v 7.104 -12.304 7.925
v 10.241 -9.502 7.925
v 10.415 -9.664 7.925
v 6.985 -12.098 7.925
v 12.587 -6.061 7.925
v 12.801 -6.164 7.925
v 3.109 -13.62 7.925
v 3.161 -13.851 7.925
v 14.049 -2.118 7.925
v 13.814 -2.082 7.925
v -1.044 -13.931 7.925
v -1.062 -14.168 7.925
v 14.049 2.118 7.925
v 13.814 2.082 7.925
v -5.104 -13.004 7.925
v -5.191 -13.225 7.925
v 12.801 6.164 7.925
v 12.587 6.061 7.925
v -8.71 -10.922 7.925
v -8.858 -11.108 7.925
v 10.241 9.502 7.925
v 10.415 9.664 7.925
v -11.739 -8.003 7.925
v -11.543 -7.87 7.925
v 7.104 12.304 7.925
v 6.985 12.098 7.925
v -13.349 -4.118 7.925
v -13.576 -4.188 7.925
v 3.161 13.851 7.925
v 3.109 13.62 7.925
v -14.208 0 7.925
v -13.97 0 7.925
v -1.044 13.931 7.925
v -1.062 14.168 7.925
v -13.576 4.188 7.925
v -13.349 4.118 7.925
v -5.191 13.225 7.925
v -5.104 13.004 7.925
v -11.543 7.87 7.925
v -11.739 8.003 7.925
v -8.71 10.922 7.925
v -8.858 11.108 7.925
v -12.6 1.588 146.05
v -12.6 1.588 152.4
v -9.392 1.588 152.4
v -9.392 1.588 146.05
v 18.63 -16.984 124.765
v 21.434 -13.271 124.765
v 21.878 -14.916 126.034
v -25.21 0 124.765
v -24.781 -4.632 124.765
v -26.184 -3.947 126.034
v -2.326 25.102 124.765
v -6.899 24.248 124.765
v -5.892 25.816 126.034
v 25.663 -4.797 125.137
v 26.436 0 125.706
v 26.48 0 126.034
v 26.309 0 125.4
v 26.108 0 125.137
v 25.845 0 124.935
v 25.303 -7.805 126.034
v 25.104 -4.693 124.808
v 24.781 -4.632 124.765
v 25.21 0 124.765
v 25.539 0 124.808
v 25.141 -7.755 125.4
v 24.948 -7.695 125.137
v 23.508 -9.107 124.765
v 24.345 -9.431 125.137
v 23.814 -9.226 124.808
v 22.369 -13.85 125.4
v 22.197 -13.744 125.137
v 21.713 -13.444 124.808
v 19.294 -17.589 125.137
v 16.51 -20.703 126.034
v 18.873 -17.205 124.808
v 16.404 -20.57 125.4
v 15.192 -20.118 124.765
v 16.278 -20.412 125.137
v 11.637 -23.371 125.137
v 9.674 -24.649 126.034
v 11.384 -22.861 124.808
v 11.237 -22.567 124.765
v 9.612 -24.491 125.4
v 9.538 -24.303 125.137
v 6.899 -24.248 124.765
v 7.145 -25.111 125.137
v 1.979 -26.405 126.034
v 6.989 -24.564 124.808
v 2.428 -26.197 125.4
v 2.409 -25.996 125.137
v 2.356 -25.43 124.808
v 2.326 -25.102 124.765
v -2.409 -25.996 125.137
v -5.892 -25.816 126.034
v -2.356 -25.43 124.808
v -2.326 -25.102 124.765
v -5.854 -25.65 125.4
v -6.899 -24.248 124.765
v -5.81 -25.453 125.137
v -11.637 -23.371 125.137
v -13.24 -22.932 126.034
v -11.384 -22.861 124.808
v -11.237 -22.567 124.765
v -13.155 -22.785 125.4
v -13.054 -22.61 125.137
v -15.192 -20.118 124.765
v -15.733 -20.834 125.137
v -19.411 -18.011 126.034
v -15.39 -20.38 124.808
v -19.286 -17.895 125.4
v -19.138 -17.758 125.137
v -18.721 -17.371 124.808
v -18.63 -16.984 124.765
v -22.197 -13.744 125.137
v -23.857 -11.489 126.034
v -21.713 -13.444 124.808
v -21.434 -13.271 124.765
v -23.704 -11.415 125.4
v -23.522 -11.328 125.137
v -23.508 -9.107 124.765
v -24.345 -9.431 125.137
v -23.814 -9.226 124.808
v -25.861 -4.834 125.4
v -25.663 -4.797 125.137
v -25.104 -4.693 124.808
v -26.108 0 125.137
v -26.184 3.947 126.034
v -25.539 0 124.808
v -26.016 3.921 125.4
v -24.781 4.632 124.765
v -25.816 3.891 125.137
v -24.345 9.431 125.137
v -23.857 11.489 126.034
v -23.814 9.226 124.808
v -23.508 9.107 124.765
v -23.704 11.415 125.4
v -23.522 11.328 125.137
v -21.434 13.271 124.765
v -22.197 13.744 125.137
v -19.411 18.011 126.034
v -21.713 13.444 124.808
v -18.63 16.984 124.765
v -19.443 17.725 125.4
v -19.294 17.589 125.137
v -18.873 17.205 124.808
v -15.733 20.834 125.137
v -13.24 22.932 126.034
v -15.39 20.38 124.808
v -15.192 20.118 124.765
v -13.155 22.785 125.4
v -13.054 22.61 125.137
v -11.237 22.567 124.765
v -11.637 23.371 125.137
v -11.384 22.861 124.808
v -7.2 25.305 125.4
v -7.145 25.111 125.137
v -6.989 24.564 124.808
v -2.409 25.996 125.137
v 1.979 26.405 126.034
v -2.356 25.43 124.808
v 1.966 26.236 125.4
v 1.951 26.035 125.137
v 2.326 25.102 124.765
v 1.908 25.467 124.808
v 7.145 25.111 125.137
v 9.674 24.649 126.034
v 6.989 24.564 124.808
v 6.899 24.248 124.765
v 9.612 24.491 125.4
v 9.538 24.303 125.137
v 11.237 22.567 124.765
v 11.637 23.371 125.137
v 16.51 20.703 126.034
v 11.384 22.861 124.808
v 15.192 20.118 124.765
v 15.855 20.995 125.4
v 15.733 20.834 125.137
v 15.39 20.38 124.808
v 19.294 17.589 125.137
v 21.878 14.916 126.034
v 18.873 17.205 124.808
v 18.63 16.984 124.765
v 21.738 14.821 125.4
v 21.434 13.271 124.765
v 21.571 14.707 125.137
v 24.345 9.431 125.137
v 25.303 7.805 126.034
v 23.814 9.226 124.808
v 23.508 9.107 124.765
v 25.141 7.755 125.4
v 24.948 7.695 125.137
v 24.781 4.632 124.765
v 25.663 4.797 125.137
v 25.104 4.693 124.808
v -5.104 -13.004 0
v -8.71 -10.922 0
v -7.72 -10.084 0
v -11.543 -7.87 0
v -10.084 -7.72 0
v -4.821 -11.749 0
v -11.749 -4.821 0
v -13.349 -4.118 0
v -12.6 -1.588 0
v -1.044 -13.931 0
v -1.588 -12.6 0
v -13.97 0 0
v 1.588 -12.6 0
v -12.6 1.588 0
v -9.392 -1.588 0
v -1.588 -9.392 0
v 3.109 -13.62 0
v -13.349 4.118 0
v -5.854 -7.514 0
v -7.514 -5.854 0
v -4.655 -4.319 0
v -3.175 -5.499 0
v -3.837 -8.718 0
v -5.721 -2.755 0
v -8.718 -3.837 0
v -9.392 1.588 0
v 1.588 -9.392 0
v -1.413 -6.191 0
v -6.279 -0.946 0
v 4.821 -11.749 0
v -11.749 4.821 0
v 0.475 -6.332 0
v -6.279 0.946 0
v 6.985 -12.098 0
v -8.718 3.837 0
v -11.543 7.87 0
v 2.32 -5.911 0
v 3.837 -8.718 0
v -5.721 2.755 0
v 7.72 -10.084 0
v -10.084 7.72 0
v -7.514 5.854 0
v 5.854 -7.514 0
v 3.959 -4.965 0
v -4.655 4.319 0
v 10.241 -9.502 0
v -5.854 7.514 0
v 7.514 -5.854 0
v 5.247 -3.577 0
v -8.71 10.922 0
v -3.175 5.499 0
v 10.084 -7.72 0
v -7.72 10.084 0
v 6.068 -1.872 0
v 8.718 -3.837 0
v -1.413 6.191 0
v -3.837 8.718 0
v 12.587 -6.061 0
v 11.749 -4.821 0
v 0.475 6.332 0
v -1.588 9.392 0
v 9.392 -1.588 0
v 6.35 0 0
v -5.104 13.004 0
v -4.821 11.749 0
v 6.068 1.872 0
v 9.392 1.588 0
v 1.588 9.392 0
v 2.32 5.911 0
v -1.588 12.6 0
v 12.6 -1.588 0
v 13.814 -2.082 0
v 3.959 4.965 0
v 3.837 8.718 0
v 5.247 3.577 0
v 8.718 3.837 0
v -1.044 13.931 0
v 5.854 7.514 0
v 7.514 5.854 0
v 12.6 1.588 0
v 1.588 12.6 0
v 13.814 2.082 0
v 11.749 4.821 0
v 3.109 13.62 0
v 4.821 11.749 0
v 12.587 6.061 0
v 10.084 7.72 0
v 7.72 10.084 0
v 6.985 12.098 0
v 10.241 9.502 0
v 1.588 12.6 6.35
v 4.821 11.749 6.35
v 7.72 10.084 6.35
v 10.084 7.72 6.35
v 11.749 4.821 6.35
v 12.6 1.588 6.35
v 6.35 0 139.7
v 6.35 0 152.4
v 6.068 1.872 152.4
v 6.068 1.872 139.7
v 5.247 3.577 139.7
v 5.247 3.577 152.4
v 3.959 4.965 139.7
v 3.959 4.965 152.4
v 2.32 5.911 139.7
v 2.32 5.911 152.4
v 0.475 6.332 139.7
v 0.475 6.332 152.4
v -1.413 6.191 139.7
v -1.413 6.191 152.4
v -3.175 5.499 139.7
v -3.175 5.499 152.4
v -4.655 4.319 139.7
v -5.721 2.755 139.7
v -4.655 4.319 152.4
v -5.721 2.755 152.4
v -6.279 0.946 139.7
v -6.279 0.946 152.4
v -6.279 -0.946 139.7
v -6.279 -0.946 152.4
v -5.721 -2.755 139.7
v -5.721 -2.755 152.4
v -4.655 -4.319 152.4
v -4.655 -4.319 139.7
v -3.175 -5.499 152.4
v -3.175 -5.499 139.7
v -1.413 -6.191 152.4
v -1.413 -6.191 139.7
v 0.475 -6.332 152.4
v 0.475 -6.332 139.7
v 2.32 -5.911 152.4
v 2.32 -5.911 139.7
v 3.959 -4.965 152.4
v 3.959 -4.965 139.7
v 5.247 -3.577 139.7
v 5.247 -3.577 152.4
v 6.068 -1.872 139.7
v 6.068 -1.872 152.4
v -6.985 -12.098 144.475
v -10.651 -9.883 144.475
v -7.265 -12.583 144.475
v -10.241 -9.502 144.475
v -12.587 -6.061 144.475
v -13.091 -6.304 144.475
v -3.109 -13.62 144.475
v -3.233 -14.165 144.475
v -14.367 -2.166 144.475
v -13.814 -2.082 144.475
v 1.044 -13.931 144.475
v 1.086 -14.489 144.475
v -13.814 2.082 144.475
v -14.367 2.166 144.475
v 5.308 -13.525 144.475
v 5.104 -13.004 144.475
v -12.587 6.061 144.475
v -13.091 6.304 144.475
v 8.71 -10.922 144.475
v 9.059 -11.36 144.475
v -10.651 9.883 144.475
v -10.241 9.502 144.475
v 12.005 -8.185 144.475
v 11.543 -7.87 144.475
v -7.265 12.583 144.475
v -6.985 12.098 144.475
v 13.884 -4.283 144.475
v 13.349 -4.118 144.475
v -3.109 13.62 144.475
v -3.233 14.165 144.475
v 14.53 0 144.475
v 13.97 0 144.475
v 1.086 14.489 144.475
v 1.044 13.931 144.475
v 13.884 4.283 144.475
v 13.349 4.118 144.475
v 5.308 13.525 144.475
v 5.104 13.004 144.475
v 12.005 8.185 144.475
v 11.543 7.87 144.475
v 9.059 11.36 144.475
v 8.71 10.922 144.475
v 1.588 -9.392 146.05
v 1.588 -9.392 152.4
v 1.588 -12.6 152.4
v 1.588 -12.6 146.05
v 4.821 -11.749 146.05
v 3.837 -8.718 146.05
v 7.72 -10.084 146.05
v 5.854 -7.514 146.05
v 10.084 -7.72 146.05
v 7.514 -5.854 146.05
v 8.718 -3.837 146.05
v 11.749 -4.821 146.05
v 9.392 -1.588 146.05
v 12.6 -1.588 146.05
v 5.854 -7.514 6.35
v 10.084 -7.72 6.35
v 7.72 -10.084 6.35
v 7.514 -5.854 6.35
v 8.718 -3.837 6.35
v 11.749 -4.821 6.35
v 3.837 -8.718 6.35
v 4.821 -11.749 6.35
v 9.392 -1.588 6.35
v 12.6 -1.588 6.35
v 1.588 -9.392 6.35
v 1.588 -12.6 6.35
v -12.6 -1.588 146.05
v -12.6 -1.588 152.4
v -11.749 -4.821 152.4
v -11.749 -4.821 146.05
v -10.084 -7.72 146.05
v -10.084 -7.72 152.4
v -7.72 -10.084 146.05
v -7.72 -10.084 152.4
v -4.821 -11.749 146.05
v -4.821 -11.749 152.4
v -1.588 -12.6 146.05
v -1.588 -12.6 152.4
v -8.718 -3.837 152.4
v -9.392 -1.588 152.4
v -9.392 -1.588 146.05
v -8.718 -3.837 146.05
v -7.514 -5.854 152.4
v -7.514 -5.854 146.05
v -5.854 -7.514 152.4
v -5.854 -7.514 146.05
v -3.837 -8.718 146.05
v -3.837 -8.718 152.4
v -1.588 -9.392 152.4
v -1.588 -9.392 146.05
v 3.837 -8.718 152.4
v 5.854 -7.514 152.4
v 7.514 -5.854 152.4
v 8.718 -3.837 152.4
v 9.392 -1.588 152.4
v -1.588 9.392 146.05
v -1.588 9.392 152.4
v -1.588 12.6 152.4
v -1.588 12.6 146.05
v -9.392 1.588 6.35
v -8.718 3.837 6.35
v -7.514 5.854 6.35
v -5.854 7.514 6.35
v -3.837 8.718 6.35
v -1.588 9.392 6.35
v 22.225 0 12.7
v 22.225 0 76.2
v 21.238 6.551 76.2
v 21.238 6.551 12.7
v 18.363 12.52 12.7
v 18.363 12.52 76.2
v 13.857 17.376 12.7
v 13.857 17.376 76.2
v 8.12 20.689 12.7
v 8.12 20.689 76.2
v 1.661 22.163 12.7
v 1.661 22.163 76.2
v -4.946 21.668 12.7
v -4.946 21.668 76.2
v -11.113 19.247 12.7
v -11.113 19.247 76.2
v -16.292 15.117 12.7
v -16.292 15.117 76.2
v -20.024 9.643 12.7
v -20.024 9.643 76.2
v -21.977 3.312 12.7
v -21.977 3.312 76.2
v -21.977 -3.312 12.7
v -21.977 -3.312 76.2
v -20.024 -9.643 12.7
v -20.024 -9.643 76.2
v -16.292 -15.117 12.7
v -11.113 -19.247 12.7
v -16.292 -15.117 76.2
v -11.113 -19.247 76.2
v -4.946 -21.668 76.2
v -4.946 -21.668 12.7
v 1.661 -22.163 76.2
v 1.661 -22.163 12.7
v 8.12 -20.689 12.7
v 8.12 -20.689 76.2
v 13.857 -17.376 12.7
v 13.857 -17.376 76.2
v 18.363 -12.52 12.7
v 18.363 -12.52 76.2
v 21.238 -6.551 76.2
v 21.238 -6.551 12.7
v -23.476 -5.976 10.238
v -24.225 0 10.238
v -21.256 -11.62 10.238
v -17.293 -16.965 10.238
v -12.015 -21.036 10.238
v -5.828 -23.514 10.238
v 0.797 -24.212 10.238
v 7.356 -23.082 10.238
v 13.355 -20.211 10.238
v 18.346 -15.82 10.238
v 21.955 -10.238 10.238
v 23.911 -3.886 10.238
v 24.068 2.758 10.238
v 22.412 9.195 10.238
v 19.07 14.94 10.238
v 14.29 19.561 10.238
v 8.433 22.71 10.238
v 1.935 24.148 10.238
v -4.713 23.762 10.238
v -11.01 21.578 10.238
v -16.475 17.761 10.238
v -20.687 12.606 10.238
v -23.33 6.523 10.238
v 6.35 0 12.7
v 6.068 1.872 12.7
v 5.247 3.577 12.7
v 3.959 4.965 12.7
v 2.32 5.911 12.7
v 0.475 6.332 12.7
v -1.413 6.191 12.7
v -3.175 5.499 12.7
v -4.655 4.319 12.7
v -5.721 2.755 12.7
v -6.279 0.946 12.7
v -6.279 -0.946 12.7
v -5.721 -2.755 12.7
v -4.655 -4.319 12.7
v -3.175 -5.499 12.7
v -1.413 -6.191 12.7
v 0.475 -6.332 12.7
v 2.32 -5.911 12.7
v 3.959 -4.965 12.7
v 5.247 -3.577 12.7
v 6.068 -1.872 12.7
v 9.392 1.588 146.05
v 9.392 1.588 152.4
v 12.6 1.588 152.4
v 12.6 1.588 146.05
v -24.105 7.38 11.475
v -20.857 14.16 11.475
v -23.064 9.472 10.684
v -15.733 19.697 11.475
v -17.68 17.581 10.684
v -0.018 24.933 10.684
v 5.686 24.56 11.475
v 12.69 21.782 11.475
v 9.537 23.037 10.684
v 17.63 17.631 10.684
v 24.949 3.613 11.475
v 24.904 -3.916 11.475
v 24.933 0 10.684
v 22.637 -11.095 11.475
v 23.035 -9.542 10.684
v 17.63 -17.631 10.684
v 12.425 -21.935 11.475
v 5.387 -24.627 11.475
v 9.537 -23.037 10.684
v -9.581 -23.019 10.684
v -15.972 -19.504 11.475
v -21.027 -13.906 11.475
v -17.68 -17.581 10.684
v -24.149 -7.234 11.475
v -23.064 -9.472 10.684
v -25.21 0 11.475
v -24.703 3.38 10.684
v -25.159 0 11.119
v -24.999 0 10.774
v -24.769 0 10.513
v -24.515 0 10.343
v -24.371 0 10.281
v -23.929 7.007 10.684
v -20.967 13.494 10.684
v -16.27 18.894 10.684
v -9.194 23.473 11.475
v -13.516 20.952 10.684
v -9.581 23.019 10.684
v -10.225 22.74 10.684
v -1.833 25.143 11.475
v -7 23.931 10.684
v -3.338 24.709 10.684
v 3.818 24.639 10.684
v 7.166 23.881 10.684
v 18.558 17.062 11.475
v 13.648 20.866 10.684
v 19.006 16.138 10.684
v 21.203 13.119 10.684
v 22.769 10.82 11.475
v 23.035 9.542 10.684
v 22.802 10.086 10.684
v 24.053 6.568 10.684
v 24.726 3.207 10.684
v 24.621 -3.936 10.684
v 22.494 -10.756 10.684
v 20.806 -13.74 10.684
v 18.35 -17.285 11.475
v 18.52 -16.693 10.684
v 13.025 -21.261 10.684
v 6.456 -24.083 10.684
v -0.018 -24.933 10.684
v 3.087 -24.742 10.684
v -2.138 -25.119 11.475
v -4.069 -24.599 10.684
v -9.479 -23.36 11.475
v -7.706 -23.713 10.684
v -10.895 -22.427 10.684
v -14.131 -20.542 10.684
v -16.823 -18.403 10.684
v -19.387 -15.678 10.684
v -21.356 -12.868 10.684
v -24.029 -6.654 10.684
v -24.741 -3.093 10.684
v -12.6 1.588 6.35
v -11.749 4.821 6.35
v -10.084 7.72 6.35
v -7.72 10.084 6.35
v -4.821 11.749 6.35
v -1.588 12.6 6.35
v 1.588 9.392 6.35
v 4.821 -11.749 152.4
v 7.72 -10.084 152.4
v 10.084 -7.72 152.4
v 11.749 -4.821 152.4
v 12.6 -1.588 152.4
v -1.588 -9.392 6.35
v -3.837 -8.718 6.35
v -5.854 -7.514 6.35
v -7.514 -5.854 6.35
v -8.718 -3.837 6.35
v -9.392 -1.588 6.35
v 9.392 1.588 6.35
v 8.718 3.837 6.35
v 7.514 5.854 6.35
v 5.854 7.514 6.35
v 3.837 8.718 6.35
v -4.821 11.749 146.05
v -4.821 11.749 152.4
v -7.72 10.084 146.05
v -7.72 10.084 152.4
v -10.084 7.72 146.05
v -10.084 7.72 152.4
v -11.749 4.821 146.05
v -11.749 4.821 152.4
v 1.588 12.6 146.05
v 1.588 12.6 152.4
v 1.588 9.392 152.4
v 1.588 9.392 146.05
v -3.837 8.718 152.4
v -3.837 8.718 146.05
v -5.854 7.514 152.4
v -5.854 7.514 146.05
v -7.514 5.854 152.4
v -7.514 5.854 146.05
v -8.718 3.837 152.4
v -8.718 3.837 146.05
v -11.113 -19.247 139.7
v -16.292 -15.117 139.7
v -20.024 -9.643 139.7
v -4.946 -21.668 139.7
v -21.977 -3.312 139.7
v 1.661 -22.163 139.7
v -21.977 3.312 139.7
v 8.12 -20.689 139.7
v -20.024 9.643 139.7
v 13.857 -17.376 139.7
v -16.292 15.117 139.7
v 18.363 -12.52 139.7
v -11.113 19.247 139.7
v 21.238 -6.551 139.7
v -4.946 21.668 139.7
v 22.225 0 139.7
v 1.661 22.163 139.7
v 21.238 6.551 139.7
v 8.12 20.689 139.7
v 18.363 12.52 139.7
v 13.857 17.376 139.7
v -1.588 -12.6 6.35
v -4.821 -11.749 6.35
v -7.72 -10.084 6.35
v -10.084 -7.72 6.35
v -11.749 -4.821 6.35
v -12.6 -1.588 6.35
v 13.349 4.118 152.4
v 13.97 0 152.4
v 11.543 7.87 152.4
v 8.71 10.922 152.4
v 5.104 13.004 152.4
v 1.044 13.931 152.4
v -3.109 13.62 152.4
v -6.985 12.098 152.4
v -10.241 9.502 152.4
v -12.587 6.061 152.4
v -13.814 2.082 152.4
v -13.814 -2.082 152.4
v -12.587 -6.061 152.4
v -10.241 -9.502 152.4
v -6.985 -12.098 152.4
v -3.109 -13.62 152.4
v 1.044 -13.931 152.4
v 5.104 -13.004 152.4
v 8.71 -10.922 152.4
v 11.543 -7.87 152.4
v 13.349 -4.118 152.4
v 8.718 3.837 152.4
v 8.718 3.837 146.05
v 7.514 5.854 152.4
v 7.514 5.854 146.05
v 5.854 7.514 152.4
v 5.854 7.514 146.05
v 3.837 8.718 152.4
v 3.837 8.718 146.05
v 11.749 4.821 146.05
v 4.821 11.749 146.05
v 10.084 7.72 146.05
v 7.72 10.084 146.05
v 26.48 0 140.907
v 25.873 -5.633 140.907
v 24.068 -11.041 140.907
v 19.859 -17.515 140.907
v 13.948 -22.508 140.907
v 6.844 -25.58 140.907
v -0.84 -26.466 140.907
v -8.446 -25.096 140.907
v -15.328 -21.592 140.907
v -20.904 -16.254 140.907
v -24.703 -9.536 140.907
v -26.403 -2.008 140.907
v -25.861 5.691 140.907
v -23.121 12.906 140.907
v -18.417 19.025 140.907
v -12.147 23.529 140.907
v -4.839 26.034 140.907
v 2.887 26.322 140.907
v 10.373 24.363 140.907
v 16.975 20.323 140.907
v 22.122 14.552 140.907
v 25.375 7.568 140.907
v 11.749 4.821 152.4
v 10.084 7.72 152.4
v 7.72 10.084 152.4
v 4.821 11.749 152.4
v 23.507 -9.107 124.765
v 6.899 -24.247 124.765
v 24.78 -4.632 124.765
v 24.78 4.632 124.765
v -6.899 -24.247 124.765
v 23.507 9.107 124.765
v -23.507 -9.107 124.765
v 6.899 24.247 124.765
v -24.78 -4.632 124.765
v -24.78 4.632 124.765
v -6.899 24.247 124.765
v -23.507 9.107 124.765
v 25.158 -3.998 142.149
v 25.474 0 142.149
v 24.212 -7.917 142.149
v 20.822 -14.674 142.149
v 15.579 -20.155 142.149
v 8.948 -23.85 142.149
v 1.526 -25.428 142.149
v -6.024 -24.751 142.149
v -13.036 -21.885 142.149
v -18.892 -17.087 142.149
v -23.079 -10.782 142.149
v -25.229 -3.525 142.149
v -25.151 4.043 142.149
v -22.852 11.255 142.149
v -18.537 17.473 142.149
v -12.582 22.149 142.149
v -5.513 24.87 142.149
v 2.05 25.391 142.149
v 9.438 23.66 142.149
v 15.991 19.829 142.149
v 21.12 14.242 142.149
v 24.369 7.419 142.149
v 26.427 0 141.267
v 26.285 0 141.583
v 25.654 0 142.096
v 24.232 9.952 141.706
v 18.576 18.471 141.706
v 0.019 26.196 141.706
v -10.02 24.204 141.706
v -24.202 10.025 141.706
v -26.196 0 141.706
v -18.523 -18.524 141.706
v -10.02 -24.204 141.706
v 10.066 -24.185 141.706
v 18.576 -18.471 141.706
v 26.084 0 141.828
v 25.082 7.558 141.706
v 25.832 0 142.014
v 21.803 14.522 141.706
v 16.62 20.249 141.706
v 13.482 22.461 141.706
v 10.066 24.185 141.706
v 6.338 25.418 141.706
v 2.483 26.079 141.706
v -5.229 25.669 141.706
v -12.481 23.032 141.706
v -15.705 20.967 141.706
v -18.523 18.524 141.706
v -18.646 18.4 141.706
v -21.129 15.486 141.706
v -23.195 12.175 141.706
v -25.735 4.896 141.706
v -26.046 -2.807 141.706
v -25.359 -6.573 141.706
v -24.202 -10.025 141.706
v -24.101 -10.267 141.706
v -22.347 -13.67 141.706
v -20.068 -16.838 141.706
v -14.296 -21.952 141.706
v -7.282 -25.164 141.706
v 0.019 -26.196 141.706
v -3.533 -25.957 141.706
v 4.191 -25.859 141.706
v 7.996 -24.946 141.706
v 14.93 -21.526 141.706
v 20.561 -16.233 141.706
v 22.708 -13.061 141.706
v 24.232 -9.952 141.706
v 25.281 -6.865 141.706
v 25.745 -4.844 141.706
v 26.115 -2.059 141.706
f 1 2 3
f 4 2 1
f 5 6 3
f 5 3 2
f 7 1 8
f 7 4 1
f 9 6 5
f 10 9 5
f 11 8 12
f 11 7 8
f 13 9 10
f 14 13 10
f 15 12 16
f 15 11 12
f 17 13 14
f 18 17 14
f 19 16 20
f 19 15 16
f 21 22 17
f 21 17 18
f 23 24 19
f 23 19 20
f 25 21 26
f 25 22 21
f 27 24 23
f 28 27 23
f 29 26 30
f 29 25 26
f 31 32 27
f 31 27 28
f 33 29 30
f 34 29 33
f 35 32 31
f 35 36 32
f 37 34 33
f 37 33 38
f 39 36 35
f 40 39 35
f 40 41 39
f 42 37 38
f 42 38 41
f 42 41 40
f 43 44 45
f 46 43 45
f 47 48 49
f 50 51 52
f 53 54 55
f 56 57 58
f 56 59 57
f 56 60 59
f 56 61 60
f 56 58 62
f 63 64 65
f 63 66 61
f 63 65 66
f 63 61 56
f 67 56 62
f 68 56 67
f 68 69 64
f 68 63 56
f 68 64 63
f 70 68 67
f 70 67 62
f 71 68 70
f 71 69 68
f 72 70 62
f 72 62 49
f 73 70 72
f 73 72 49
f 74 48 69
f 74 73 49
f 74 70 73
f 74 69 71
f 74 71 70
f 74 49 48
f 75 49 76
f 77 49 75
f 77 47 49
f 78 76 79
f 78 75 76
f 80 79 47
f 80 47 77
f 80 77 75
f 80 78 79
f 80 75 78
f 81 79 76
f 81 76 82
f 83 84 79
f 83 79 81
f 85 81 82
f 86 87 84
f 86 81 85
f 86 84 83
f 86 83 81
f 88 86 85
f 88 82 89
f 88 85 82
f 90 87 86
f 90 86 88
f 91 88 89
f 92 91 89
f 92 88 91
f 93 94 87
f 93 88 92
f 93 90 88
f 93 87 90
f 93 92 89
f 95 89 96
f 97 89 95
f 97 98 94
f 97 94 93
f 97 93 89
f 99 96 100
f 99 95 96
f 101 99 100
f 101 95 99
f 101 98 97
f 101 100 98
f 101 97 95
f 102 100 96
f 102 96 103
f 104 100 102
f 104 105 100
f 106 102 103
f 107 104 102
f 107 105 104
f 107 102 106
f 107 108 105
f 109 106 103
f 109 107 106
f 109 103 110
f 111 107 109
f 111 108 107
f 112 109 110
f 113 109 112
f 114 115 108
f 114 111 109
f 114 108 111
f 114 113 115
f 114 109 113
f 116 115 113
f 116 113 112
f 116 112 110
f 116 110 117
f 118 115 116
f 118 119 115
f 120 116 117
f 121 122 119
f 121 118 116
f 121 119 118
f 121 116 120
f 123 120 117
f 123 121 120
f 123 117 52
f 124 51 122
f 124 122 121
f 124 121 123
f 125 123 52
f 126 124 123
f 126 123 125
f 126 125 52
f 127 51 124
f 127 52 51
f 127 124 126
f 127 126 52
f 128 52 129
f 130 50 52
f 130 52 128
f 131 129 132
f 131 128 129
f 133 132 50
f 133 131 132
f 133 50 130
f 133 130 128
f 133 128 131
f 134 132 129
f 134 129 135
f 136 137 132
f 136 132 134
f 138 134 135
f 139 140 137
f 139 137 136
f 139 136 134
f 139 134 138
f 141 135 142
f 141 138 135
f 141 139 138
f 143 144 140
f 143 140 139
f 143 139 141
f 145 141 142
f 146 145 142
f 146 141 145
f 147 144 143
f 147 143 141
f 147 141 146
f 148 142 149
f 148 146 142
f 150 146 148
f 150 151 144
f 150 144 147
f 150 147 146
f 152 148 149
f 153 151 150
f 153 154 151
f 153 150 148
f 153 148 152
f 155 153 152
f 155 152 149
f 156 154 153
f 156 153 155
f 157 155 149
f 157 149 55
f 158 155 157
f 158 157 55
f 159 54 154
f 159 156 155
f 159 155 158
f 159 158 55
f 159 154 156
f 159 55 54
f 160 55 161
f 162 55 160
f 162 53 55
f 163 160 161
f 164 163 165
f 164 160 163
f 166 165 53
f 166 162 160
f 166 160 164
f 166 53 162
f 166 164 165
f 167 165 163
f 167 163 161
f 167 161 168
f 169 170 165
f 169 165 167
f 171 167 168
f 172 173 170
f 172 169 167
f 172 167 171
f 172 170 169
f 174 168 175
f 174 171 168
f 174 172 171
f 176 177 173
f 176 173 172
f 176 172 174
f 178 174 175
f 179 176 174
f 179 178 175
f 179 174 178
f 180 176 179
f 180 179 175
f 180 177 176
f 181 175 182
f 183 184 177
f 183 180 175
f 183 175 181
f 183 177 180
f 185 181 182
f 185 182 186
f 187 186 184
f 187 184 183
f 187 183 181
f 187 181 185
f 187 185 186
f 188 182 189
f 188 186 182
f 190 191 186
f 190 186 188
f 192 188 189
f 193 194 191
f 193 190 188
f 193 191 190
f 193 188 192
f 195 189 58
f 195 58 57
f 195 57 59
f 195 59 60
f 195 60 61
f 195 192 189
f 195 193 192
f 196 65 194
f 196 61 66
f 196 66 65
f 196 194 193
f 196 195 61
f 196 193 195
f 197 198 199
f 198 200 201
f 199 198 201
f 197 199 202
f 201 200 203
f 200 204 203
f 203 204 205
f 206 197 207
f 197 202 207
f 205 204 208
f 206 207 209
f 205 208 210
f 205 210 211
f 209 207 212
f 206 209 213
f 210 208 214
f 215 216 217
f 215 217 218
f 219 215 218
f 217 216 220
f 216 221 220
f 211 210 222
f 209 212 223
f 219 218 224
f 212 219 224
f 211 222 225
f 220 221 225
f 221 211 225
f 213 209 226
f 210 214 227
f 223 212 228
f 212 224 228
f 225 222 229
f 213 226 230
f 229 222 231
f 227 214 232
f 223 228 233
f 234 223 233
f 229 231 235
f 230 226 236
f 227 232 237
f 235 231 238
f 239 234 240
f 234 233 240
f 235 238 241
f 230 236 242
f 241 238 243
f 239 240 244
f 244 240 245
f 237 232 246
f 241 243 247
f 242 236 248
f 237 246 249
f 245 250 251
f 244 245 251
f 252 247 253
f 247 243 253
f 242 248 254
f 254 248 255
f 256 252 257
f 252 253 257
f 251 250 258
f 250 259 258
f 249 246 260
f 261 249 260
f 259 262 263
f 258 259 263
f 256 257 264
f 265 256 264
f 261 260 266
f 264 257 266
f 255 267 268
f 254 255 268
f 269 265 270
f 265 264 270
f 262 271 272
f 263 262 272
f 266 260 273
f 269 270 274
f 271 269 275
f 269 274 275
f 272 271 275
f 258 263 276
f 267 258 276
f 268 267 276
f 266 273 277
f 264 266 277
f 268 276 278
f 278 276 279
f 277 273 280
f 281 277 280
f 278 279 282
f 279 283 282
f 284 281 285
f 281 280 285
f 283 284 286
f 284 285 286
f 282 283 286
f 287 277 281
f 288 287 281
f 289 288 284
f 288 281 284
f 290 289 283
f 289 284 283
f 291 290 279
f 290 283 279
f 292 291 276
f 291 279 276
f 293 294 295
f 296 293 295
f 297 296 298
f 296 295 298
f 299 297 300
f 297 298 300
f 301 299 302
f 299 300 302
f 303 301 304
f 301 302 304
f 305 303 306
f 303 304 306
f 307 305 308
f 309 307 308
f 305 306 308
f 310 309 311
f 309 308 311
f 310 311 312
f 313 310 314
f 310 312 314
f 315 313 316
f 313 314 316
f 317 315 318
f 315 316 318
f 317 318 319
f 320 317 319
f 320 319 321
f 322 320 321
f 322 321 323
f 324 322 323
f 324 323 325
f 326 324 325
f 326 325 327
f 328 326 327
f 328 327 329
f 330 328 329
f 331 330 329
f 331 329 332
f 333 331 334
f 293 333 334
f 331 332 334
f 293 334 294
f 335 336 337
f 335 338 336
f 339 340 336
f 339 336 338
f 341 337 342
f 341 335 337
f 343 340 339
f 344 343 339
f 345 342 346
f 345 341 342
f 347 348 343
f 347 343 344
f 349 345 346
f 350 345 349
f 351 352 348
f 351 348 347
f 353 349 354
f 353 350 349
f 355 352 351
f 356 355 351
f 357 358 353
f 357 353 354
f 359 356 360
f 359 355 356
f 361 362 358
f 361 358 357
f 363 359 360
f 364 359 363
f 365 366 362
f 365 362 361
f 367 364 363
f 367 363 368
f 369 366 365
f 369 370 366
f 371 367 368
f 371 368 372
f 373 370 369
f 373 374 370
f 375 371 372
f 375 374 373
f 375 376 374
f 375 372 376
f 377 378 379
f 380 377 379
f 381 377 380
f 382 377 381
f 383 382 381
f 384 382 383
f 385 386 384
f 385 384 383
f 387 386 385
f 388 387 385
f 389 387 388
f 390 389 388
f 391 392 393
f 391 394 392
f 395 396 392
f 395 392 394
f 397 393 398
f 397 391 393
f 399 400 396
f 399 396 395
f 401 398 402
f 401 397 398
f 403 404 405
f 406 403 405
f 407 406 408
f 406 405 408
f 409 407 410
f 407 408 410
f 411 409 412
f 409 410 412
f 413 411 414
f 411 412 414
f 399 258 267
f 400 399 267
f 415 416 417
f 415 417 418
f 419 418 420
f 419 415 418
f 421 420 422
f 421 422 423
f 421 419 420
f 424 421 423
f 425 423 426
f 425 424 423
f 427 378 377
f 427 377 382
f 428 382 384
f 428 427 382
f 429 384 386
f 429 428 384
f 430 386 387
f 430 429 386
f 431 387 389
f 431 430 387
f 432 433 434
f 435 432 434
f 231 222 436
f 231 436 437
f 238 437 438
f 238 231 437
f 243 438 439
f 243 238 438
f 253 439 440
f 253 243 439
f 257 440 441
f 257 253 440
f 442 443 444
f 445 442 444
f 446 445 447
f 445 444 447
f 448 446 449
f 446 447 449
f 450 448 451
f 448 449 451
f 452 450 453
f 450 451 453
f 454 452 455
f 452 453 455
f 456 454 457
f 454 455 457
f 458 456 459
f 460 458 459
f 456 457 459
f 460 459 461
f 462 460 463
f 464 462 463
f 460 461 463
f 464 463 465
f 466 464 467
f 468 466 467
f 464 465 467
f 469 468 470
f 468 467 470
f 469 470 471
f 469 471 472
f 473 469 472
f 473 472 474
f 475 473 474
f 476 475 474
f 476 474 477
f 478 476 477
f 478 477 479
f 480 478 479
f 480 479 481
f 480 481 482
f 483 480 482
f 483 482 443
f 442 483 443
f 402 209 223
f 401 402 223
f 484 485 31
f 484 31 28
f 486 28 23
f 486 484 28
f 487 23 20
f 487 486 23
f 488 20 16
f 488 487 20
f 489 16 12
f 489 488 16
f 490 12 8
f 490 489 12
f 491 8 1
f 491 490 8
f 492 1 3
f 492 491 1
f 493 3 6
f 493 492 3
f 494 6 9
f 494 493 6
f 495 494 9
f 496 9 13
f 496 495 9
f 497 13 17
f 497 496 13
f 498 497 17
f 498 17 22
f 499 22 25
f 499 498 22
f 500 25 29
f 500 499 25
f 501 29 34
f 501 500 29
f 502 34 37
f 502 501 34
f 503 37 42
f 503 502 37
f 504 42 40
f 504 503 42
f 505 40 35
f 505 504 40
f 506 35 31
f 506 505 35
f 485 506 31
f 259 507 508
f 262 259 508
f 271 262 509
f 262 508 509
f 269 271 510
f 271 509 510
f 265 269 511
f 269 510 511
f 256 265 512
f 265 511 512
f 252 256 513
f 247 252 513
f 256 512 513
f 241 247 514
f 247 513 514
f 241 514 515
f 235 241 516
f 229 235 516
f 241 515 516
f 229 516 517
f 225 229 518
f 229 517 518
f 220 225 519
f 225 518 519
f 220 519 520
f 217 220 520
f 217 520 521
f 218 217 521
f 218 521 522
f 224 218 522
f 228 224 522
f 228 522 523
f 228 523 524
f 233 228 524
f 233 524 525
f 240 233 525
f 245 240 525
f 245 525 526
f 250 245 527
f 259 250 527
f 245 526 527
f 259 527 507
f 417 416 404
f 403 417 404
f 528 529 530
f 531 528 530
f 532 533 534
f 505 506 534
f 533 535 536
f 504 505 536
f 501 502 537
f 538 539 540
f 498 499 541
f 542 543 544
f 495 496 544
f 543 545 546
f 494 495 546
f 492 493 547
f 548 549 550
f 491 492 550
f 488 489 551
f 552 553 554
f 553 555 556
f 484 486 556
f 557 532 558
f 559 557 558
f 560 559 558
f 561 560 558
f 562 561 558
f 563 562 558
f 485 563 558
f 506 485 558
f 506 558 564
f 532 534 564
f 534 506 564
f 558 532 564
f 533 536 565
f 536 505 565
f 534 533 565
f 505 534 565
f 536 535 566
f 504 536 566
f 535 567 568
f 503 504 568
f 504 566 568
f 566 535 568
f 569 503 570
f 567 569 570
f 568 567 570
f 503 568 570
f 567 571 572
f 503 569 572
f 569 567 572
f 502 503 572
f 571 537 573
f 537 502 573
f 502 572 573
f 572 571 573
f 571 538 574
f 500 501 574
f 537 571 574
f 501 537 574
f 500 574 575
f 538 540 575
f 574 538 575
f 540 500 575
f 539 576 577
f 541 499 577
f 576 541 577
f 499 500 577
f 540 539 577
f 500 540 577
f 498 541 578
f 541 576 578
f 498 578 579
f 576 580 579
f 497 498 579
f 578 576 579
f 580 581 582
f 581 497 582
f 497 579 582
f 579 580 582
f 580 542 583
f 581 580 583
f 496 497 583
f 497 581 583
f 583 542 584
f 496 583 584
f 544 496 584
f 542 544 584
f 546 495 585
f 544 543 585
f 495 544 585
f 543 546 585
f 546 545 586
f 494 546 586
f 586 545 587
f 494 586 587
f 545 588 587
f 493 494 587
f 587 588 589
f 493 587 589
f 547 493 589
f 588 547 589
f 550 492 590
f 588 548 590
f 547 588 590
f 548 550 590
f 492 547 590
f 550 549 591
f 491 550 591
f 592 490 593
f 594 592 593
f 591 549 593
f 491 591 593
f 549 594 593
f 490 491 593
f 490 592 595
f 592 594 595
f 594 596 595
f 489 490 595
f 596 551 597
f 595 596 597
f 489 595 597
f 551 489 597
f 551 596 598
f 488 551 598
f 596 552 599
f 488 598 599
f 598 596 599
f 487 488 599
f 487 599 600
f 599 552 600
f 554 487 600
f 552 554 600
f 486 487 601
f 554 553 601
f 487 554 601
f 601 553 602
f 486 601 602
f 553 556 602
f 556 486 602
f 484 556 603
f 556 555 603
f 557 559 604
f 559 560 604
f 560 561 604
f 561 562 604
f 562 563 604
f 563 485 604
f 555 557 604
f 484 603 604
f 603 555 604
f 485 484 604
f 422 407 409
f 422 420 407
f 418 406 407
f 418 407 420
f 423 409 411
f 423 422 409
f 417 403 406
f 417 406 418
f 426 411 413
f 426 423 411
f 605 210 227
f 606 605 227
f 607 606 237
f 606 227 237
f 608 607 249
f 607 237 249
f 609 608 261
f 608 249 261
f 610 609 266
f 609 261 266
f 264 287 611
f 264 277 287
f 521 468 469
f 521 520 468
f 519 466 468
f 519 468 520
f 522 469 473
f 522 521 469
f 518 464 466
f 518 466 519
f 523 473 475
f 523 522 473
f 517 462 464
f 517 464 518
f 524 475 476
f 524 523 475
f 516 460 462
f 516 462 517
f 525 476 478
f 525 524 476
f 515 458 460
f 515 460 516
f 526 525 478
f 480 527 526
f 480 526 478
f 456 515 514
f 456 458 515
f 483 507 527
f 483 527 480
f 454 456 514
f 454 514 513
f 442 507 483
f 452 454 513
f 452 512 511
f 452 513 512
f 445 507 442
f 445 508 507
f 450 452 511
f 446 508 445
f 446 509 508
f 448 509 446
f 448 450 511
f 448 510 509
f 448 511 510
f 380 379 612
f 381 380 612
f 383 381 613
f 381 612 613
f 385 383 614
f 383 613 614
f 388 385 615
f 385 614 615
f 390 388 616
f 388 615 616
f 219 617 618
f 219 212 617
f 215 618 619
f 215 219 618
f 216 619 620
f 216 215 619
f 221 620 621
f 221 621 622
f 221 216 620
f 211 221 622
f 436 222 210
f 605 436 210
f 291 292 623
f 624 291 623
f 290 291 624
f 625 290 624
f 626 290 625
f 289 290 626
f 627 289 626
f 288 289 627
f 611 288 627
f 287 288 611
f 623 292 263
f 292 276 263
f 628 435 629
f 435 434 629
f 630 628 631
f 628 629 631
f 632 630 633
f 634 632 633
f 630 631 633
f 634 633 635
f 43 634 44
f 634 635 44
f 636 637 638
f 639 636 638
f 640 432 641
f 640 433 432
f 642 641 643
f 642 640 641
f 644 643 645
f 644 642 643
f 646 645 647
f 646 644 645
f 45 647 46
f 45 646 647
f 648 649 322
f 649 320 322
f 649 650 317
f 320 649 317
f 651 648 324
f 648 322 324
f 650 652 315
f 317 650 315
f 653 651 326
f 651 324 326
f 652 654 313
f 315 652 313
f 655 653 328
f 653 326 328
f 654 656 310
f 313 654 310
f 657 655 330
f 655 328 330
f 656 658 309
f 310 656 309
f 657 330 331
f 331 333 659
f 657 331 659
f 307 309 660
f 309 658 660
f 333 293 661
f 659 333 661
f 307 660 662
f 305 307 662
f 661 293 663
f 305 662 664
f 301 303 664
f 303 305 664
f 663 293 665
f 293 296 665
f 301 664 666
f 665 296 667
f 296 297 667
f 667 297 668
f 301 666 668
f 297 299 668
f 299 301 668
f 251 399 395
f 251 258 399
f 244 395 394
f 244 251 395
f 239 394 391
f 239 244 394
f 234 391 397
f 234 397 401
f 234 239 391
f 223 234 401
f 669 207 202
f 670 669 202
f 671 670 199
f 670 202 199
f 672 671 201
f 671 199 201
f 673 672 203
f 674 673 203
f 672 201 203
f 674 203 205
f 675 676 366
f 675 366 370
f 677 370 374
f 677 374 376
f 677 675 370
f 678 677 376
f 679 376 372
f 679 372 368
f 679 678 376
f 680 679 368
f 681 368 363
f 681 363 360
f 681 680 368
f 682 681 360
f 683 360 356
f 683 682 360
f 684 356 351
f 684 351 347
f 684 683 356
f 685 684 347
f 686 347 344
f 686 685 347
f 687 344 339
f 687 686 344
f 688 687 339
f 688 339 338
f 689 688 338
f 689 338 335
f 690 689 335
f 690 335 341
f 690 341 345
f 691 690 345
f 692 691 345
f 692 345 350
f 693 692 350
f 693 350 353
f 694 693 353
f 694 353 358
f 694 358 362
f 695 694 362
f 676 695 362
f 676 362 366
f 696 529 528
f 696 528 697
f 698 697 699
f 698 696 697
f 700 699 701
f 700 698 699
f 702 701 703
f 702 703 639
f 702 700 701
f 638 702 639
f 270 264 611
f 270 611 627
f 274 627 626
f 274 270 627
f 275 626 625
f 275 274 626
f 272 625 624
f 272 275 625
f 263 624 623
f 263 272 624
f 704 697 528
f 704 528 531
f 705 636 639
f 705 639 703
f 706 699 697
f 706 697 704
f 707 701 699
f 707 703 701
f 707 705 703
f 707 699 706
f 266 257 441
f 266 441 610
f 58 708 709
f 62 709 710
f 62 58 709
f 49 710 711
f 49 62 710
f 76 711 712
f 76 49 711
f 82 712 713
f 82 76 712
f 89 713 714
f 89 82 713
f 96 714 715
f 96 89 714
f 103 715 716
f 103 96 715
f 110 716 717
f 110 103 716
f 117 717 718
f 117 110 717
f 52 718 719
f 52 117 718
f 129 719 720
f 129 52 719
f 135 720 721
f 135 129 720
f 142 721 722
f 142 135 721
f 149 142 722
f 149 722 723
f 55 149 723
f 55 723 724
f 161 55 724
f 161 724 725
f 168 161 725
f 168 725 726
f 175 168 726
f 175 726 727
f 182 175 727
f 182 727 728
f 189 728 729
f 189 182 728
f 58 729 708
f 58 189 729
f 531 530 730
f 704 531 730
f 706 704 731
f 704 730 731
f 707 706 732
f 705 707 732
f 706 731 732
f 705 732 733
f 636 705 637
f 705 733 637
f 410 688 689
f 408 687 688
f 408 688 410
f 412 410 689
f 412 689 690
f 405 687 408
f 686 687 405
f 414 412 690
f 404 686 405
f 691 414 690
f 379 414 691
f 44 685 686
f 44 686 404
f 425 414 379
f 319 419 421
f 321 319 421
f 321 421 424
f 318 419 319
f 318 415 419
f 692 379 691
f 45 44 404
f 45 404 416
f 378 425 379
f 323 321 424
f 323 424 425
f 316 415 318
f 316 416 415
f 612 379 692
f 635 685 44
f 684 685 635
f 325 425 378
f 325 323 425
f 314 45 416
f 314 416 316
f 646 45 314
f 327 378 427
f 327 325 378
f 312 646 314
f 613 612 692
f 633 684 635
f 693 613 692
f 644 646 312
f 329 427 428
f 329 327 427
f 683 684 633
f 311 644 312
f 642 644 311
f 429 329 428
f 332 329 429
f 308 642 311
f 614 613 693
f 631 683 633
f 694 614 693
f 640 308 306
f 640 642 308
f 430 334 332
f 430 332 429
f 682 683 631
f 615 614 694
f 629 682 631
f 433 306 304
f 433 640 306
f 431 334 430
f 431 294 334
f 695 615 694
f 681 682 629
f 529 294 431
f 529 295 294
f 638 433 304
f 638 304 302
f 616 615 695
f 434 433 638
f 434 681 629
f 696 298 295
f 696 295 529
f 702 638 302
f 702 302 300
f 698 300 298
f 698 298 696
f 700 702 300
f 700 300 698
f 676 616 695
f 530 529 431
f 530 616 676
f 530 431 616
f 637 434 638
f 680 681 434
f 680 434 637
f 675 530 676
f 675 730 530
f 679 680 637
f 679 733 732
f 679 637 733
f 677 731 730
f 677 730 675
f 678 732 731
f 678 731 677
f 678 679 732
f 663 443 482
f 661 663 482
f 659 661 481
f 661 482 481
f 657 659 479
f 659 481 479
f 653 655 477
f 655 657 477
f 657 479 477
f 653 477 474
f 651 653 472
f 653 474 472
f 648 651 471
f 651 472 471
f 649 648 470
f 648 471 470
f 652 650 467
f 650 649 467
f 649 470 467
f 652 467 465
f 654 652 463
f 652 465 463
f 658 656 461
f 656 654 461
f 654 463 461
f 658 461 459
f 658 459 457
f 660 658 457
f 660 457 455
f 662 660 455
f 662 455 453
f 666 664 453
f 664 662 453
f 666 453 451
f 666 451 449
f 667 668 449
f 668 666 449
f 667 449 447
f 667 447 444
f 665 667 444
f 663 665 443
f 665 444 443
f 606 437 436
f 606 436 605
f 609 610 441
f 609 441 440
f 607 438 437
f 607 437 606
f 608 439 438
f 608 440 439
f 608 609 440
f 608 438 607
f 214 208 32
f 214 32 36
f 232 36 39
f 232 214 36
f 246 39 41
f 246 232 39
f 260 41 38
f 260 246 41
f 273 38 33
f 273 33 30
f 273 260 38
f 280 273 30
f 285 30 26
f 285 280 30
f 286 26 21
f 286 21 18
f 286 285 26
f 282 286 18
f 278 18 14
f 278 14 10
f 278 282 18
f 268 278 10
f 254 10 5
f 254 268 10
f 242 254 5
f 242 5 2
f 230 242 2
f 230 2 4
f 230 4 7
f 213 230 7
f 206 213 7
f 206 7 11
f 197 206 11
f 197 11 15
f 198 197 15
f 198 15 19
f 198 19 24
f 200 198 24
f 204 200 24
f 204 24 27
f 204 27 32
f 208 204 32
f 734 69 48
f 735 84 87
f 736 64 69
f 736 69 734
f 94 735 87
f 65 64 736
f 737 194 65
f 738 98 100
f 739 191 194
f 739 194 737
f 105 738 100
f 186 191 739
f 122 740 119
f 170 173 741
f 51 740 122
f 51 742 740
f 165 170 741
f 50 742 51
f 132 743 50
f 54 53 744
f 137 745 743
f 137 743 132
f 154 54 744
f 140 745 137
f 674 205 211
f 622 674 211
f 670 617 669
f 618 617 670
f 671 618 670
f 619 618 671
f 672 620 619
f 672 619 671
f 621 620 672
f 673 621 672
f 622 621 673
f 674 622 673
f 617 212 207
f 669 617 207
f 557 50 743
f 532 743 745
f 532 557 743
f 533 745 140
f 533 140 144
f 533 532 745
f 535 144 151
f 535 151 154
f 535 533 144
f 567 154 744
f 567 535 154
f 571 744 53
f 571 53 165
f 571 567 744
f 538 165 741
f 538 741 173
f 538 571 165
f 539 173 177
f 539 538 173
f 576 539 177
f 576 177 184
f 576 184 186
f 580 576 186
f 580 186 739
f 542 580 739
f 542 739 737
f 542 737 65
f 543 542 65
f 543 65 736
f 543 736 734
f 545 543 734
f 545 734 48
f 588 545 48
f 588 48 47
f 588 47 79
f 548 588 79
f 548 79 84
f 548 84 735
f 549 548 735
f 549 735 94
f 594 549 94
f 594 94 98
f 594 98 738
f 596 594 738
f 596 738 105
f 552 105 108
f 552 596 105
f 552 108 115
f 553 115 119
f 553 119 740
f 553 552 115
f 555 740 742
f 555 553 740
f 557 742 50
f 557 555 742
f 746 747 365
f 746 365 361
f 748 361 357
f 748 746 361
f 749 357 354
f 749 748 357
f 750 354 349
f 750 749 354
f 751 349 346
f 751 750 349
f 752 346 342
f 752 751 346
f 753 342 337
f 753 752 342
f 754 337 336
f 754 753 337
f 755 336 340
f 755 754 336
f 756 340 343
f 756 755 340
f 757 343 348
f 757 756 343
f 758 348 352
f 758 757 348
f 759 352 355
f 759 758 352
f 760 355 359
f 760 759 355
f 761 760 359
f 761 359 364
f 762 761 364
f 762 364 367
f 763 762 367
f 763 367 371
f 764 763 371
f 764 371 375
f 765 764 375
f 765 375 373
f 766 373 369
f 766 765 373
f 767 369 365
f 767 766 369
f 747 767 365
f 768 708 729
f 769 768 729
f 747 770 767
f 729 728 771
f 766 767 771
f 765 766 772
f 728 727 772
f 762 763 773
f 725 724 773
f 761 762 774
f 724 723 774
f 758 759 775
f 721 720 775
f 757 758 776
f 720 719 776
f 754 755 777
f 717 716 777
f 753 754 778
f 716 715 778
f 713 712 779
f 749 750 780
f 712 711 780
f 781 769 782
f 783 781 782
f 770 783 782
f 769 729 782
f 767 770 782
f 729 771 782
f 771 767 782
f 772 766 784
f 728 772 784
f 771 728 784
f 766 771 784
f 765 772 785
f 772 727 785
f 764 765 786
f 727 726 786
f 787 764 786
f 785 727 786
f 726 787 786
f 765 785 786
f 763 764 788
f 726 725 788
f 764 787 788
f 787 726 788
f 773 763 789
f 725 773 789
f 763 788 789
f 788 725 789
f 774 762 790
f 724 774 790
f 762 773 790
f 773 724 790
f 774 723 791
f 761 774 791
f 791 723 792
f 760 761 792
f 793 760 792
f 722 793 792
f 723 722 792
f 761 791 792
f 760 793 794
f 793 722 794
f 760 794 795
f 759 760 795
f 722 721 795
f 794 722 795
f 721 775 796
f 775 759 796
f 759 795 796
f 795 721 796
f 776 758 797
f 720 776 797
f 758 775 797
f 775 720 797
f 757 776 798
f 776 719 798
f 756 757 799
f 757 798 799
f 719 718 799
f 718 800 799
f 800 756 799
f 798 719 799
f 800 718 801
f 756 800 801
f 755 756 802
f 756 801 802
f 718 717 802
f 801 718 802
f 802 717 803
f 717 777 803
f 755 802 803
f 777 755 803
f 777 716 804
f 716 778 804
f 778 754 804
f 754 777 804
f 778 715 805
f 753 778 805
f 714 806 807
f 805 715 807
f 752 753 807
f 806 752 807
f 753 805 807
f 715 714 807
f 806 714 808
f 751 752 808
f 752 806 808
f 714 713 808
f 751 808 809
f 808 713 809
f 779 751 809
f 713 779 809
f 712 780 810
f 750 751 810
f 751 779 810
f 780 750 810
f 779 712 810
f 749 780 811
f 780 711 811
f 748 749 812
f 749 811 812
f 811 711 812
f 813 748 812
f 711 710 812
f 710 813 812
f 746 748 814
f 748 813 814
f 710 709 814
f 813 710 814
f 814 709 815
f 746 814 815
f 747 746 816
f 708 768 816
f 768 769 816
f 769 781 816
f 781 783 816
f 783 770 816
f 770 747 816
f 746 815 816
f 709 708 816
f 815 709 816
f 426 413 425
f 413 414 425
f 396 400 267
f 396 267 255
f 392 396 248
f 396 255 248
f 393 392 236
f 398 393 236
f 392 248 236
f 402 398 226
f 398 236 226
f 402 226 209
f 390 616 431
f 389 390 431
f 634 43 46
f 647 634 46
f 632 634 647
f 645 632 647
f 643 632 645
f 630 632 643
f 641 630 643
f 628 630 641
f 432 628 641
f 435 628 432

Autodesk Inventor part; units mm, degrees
ref_plane "YZ Plane" through (0, 0, 0) normal (1, 0, 0) x (0, 1, 0)
ref_plane "XZ Plane" through (0, 0, 0) normal (0, 1, 0) x (-1, 0, 0)
ref_plane "XY Plane" through (0, 0, 0) normal (0, 0, 1) x (1, 0, 0)
sketch "Sketch1" plane through (0, 0, 0) normal (0, 0, 1) x (1, 0, 0)
  circle A0 centre (0, 0) radius 26.4795
  dimension "d0" = 52.959
extrude "Extrusion1" add sketch "Sketch1" along normal blind 152.4
sketch "Sketch2" plane through (0, 0, 152.4) normal (0, 0, 1) x (1, 0, 0)
  circle A0 centre (0, 0) radius 13.97
  circle A1 centre (0, 0) radius 26.4795
  dimension "d3" = 27.94
extrude "Extrusion2" cut sketch "Sketch2" against normal blind 7.9248
sketch "Sketch3" plane through (0, 0, 0) normal (0, 0, -1) x (-1, 0, 0)
  circle A0 centre (0, 0) radius 13.97
  circle A1 centre (0, 0) radius 26.4795
  dimension "d6" = 27.94
extrude "Extrusion3" cut sketch "Sketch3" against normal blind 7.9248
sketch "Sketch4" plane through (0, 0, 7.9248) normal (0, 0, -1) x (-1, 0, 0)
  circle A0 centre (0, 0) radius 13.97 projected
  circle A1 centre (0, 0) radius 25.2095
  circle A2 centre (0, 0) radius 26.4795
  dimension "d9" = 50.419
extrude "Extrusion4" cut sketch "Sketch4" against normal blind 116.84 contours A2
fillet "Fillet1" radius 1.27 1 edges at (-26.4795, 0, 124.7648)
chamfer "Chamfer1" distance 2.54 angle 78 1 edges at (-26.4795, 0, 144.4752) measured on face at (26.3936, -2.1307, 138.3282)
fillet "Fillet2" radius 1.27 1 edges at (-26.4795, 0, 141.9352)
chamfer "Chamfer2" distance 2.54 angle 77 1 edges at (25.2095, 0, 7.9248) measured on face at (-24.883, -4.0439, 85.8181)
fillet "Fillet3" radius 1.27 1 edges at (25.2095, 0, 10.4648)
sketch "Sketch6" plane through (0, 0, 152.4) normal (0, 0, 1) x (1, 0, 0)
  circle A0 centre (0, 0) radius 6.35
  dimension "d23" = 12.7
extrude "Extrusion6" cut sketch "Sketch6" against normal through all
sketch "Sketch7" plane through (0, 0, 7.9248) normal (0, 0, -1) x (-1, 0, 0)
  circle A0 centre (0, 0) radius 22.225
  dimension "d26" = 44.45
sketch "Sketch8" plane through (0, 0, 0) normal (0, 0, -1) x (-1, 0, 0)
  circle A0 centre (0, 0) radius 1.3033
extrude "Extrusion7" add sketch "Sketch8" against normal blind 76.2
sketch "Sketch9" plane through (0, 0, 76.2) normal (0, 0, 1) x (1, 0, 0)
  circle A0 centre (0, 0) radius 1.3033 projected
  circle A1 centre (0, 0) radius 22.225
  dimension "d29" = 44.45
extrude "Extrusion8" cut sketch "Sketch9" along normal blind 63.5 and the other way blind 63.5
sketch "Sketch10" plane through (0, 0, 0) normal (0, 0, -1) x (-1, 0, 0)
  circle A0 centre (0, 0) radius 1.9784
extrude "Extrusion9" cut sketch "Sketch10" against normal through all
thread "Thread1" size "1/2-13 UNC" class "2B" standard "ANSI Unified Screw Threads" length 18.2626
thread "Thread2" size "1/2-13 UNC" class "2B" standard "ANSI Unified Screw Threads" length 18.2626
sketch "Sketch11" plane through (0, 0, 152.4) normal (0, 0, 1) x (1, 0, 0)
  circle A0 centre (0, 0) radius 12.7
  circle A1 centre (0, 0) radius 9.525
  circle A2 centre (0, 9.525) radius 1.5875
  circle A3 centre (9.525, 0) radius 1.5875
  circle A4 centre (0, -9.525) radius 1.5875
  circle A5 centre (-9.525, 0) radius 1.5875
  line L0 (-13.6194, 1.5875) -> (-8.6056, 1.5875)
  line L1 (-8.6056, 1.5875) -> (-8.6056, -1.5875)
  line L2 (-8.6056, -1.5875) -> (-13.6194, -1.5875)
  line L3 (-13.6194, -1.5875) -> (-13.6194, 1.5875)
  line L4 (-13.6194, 1.5875) -> (-8.6056, -1.5875) construction
  line L5 (-8.6056, 1.5875) -> (-13.6194, -1.5875) construction
  line L6 (6.086, 1.5875) -> (12.964, 1.5875)
  line L7 (12.964, 1.5875) -> (12.964, -1.5875)
  line L8 (12.964, -1.5875) -> (6.086, -1.5875)
  line L9 (6.086, -1.5875) -> (6.086, 1.5875)
  line L10 (6.086, 1.5875) -> (12.964, -1.5875) construction
  line L11 (12.964, 1.5875) -> (6.086, -1.5875) construction
  line L12 (-1.5875, -6.1744) -> (1.5875, -6.1744)
  line L13 (1.5875, -6.1744) -> (1.5875, -12.8756)
  line L14 (1.5875, -12.8756) -> (-1.5875, -12.8756)
  line L15 (-1.5875, -12.8756) -> (-1.5875, -6.1744)
  line L16 (-1.5875, -6.1744) -> (1.5875, -12.8756) construction
  line L17 (1.5875, -6.1744) -> (-1.5875, -12.8756) construction
  circle A6 centre (0, 0) radius 6.35 projected
  line L18 (-1.5875, 12.9016) -> (1.5875, 12.9016)
  line L19 (1.5875, 12.9016) -> (1.5875, 6.1484)
  line L20 (1.5875, 6.1484) -> (-1.5875, 6.1484)
  line L21 (-1.5875, 6.1484) -> (-1.5875, 12.9016)
  line L22 (-1.5875, 12.9016) -> (1.5875, 6.1484) construction
  line L23 (1.5875, 12.9016) -> (-1.5875, 6.1484) construction
  point P0 (-11.1125, 0)
  point P1 (-1.5875, -9.3918)
  point P2 (-9.3918, -1.5875)
  point P3 (-12.6004, -1.5875)
  point P4 (-1.5875, -12.6004)
  point P5 (1.5875, -12.6004)
  point P6 (12.6004, -1.5875)
  point P7 (9.3918, -1.5875)
  point P8 (1.5875, -9.3918)
  point P9 (1.5875, 9.3918)
  point P10 (9.3918, 1.5875)
  point P11 (12.6004, 1.5875)
  point P12 (1.5875, 12.6004)
  point P13 (-1.5875, 12.6004)
  point P14 (-12.6004, 1.5875)
  point P15 (-9.3918, 1.5875)
  point P16 (-1.5875, 9.3918)
  dimension "d45" = 3.175
  dimension "d40" = 25.4
  dimension "d41" = 19.05
  dimension "d42" = 3.175
  dimension "d43" = 3.175
  dimension "d44" = 3.175
extrude "Extrusion10" cut sketch "Sketch11" against normal blind 6.35 contours L6 A1 L19 A0 | A0 L13 A1 L8 | L21 A1 L0 A0 | A0 L2 A1 L15
sketch "Sketch12" plane through (0, 0, 0) normal (0, 0, -1) x (-1, 0, 0)
  circle A0 centre (0, 0) radius 12.7
  line L0 (12.6004, -1.5875) -> (9.3918, -1.5875) projected
  circle A1 centre (0, 0) radius 9.525
  line L1 (-1.5875, 5.8819) -> (1.5875, 5.8819)
  line L2 (1.5875, 5.8819) -> (1.5875, 13.1681)
  line L3 (1.5875, 13.1681) -> (-1.5875, 13.1681)
  line L4 (-1.5875, 13.1681) -> (-1.5875, 5.8819)
  line L5 (-1.5875, 5.8819) -> (1.5875, 13.1681) construction
  line L6 (1.5875, 5.8819) -> (-1.5875, 13.1681) construction
  line L7 (5.4881, 1.5875) -> (13.5619, 1.5875)
  line L8 (13.5619, 1.5875) -> (13.5619, -1.5875)
  line L9 (13.5619, -1.5875) -> (5.4881, -1.5875)
  line L10 (5.4881, -1.5875) -> (5.4881, 1.5875)
  line L11 (5.4881, 1.5875) -> (13.5619, -1.5875) construction
  line L12 (13.5619, 1.5875) -> (5.4881, -1.5875) construction
  line L13 (-1.5875, -5.9212) -> (1.5875, -5.9212)
  line L14 (1.5875, -5.9212) -> (1.5875, -13.1288)
  line L15 (1.5875, -13.1288) -> (-1.5875, -13.1288)
  line L16 (-1.5875, -13.1288) -> (-1.5875, -5.9212)
  line L17 (-1.5875, -5.9212) -> (1.5875, -13.1288) construction
  line L18 (1.5875, -5.9212) -> (-1.5875, -13.1288) construction
  line L19 (-12.9783, 1.5875) -> (-6.0717, 1.5875)
  line L20 (-6.0717, 1.5875) -> (-6.0717, -1.5875)
  line L21 (-6.0717, -1.5875) -> (-12.9783, -1.5875)
  line L22 (-12.9783, -1.5875) -> (-12.9783, 1.5875)
  line L23 (-12.9783, 1.5875) -> (-6.0717, -1.5875) construction
  line L24 (-6.0717, 1.5875) -> (-12.9783, -1.5875) construction
  point P0 (0, 9.525)
  point P1 (9.525, 0)
  point P2 (0, -9.525)
  point P3 (-9.525, 0)
  point P4 (1.5875, -9.3918)
  point P5 (1.5875, -12.6004)
  point P6 (-9.3918, -1.5875)
  point P7 (-12.6004, -1.5875)
  point P8 (-1.5875, -12.6004)
  point P9 (-1.5875, -9.3918)
  point P10 (9.3918, 1.5875)
  point P11 (12.6004, 1.5875)
  point P12 (1.5875, 12.6004)
  point P13 (1.5875, 9.3918)
  point P14 (-12.6004, 1.5875)
  point P15 (-9.3918, 1.5875)
  point P16 (-1.5875, 9.3918)
  point P17 (-1.5875, 12.6004)
extrude "Extrusion11" cut sketch "Sketch12" against normal blind 6.35 contours A0 L14 A1 L0 | L7 A1 L2 A0 | A0 L21 A1 L16 | L4 A1 L19 A0
properties part number "2x6 Air Tank"
